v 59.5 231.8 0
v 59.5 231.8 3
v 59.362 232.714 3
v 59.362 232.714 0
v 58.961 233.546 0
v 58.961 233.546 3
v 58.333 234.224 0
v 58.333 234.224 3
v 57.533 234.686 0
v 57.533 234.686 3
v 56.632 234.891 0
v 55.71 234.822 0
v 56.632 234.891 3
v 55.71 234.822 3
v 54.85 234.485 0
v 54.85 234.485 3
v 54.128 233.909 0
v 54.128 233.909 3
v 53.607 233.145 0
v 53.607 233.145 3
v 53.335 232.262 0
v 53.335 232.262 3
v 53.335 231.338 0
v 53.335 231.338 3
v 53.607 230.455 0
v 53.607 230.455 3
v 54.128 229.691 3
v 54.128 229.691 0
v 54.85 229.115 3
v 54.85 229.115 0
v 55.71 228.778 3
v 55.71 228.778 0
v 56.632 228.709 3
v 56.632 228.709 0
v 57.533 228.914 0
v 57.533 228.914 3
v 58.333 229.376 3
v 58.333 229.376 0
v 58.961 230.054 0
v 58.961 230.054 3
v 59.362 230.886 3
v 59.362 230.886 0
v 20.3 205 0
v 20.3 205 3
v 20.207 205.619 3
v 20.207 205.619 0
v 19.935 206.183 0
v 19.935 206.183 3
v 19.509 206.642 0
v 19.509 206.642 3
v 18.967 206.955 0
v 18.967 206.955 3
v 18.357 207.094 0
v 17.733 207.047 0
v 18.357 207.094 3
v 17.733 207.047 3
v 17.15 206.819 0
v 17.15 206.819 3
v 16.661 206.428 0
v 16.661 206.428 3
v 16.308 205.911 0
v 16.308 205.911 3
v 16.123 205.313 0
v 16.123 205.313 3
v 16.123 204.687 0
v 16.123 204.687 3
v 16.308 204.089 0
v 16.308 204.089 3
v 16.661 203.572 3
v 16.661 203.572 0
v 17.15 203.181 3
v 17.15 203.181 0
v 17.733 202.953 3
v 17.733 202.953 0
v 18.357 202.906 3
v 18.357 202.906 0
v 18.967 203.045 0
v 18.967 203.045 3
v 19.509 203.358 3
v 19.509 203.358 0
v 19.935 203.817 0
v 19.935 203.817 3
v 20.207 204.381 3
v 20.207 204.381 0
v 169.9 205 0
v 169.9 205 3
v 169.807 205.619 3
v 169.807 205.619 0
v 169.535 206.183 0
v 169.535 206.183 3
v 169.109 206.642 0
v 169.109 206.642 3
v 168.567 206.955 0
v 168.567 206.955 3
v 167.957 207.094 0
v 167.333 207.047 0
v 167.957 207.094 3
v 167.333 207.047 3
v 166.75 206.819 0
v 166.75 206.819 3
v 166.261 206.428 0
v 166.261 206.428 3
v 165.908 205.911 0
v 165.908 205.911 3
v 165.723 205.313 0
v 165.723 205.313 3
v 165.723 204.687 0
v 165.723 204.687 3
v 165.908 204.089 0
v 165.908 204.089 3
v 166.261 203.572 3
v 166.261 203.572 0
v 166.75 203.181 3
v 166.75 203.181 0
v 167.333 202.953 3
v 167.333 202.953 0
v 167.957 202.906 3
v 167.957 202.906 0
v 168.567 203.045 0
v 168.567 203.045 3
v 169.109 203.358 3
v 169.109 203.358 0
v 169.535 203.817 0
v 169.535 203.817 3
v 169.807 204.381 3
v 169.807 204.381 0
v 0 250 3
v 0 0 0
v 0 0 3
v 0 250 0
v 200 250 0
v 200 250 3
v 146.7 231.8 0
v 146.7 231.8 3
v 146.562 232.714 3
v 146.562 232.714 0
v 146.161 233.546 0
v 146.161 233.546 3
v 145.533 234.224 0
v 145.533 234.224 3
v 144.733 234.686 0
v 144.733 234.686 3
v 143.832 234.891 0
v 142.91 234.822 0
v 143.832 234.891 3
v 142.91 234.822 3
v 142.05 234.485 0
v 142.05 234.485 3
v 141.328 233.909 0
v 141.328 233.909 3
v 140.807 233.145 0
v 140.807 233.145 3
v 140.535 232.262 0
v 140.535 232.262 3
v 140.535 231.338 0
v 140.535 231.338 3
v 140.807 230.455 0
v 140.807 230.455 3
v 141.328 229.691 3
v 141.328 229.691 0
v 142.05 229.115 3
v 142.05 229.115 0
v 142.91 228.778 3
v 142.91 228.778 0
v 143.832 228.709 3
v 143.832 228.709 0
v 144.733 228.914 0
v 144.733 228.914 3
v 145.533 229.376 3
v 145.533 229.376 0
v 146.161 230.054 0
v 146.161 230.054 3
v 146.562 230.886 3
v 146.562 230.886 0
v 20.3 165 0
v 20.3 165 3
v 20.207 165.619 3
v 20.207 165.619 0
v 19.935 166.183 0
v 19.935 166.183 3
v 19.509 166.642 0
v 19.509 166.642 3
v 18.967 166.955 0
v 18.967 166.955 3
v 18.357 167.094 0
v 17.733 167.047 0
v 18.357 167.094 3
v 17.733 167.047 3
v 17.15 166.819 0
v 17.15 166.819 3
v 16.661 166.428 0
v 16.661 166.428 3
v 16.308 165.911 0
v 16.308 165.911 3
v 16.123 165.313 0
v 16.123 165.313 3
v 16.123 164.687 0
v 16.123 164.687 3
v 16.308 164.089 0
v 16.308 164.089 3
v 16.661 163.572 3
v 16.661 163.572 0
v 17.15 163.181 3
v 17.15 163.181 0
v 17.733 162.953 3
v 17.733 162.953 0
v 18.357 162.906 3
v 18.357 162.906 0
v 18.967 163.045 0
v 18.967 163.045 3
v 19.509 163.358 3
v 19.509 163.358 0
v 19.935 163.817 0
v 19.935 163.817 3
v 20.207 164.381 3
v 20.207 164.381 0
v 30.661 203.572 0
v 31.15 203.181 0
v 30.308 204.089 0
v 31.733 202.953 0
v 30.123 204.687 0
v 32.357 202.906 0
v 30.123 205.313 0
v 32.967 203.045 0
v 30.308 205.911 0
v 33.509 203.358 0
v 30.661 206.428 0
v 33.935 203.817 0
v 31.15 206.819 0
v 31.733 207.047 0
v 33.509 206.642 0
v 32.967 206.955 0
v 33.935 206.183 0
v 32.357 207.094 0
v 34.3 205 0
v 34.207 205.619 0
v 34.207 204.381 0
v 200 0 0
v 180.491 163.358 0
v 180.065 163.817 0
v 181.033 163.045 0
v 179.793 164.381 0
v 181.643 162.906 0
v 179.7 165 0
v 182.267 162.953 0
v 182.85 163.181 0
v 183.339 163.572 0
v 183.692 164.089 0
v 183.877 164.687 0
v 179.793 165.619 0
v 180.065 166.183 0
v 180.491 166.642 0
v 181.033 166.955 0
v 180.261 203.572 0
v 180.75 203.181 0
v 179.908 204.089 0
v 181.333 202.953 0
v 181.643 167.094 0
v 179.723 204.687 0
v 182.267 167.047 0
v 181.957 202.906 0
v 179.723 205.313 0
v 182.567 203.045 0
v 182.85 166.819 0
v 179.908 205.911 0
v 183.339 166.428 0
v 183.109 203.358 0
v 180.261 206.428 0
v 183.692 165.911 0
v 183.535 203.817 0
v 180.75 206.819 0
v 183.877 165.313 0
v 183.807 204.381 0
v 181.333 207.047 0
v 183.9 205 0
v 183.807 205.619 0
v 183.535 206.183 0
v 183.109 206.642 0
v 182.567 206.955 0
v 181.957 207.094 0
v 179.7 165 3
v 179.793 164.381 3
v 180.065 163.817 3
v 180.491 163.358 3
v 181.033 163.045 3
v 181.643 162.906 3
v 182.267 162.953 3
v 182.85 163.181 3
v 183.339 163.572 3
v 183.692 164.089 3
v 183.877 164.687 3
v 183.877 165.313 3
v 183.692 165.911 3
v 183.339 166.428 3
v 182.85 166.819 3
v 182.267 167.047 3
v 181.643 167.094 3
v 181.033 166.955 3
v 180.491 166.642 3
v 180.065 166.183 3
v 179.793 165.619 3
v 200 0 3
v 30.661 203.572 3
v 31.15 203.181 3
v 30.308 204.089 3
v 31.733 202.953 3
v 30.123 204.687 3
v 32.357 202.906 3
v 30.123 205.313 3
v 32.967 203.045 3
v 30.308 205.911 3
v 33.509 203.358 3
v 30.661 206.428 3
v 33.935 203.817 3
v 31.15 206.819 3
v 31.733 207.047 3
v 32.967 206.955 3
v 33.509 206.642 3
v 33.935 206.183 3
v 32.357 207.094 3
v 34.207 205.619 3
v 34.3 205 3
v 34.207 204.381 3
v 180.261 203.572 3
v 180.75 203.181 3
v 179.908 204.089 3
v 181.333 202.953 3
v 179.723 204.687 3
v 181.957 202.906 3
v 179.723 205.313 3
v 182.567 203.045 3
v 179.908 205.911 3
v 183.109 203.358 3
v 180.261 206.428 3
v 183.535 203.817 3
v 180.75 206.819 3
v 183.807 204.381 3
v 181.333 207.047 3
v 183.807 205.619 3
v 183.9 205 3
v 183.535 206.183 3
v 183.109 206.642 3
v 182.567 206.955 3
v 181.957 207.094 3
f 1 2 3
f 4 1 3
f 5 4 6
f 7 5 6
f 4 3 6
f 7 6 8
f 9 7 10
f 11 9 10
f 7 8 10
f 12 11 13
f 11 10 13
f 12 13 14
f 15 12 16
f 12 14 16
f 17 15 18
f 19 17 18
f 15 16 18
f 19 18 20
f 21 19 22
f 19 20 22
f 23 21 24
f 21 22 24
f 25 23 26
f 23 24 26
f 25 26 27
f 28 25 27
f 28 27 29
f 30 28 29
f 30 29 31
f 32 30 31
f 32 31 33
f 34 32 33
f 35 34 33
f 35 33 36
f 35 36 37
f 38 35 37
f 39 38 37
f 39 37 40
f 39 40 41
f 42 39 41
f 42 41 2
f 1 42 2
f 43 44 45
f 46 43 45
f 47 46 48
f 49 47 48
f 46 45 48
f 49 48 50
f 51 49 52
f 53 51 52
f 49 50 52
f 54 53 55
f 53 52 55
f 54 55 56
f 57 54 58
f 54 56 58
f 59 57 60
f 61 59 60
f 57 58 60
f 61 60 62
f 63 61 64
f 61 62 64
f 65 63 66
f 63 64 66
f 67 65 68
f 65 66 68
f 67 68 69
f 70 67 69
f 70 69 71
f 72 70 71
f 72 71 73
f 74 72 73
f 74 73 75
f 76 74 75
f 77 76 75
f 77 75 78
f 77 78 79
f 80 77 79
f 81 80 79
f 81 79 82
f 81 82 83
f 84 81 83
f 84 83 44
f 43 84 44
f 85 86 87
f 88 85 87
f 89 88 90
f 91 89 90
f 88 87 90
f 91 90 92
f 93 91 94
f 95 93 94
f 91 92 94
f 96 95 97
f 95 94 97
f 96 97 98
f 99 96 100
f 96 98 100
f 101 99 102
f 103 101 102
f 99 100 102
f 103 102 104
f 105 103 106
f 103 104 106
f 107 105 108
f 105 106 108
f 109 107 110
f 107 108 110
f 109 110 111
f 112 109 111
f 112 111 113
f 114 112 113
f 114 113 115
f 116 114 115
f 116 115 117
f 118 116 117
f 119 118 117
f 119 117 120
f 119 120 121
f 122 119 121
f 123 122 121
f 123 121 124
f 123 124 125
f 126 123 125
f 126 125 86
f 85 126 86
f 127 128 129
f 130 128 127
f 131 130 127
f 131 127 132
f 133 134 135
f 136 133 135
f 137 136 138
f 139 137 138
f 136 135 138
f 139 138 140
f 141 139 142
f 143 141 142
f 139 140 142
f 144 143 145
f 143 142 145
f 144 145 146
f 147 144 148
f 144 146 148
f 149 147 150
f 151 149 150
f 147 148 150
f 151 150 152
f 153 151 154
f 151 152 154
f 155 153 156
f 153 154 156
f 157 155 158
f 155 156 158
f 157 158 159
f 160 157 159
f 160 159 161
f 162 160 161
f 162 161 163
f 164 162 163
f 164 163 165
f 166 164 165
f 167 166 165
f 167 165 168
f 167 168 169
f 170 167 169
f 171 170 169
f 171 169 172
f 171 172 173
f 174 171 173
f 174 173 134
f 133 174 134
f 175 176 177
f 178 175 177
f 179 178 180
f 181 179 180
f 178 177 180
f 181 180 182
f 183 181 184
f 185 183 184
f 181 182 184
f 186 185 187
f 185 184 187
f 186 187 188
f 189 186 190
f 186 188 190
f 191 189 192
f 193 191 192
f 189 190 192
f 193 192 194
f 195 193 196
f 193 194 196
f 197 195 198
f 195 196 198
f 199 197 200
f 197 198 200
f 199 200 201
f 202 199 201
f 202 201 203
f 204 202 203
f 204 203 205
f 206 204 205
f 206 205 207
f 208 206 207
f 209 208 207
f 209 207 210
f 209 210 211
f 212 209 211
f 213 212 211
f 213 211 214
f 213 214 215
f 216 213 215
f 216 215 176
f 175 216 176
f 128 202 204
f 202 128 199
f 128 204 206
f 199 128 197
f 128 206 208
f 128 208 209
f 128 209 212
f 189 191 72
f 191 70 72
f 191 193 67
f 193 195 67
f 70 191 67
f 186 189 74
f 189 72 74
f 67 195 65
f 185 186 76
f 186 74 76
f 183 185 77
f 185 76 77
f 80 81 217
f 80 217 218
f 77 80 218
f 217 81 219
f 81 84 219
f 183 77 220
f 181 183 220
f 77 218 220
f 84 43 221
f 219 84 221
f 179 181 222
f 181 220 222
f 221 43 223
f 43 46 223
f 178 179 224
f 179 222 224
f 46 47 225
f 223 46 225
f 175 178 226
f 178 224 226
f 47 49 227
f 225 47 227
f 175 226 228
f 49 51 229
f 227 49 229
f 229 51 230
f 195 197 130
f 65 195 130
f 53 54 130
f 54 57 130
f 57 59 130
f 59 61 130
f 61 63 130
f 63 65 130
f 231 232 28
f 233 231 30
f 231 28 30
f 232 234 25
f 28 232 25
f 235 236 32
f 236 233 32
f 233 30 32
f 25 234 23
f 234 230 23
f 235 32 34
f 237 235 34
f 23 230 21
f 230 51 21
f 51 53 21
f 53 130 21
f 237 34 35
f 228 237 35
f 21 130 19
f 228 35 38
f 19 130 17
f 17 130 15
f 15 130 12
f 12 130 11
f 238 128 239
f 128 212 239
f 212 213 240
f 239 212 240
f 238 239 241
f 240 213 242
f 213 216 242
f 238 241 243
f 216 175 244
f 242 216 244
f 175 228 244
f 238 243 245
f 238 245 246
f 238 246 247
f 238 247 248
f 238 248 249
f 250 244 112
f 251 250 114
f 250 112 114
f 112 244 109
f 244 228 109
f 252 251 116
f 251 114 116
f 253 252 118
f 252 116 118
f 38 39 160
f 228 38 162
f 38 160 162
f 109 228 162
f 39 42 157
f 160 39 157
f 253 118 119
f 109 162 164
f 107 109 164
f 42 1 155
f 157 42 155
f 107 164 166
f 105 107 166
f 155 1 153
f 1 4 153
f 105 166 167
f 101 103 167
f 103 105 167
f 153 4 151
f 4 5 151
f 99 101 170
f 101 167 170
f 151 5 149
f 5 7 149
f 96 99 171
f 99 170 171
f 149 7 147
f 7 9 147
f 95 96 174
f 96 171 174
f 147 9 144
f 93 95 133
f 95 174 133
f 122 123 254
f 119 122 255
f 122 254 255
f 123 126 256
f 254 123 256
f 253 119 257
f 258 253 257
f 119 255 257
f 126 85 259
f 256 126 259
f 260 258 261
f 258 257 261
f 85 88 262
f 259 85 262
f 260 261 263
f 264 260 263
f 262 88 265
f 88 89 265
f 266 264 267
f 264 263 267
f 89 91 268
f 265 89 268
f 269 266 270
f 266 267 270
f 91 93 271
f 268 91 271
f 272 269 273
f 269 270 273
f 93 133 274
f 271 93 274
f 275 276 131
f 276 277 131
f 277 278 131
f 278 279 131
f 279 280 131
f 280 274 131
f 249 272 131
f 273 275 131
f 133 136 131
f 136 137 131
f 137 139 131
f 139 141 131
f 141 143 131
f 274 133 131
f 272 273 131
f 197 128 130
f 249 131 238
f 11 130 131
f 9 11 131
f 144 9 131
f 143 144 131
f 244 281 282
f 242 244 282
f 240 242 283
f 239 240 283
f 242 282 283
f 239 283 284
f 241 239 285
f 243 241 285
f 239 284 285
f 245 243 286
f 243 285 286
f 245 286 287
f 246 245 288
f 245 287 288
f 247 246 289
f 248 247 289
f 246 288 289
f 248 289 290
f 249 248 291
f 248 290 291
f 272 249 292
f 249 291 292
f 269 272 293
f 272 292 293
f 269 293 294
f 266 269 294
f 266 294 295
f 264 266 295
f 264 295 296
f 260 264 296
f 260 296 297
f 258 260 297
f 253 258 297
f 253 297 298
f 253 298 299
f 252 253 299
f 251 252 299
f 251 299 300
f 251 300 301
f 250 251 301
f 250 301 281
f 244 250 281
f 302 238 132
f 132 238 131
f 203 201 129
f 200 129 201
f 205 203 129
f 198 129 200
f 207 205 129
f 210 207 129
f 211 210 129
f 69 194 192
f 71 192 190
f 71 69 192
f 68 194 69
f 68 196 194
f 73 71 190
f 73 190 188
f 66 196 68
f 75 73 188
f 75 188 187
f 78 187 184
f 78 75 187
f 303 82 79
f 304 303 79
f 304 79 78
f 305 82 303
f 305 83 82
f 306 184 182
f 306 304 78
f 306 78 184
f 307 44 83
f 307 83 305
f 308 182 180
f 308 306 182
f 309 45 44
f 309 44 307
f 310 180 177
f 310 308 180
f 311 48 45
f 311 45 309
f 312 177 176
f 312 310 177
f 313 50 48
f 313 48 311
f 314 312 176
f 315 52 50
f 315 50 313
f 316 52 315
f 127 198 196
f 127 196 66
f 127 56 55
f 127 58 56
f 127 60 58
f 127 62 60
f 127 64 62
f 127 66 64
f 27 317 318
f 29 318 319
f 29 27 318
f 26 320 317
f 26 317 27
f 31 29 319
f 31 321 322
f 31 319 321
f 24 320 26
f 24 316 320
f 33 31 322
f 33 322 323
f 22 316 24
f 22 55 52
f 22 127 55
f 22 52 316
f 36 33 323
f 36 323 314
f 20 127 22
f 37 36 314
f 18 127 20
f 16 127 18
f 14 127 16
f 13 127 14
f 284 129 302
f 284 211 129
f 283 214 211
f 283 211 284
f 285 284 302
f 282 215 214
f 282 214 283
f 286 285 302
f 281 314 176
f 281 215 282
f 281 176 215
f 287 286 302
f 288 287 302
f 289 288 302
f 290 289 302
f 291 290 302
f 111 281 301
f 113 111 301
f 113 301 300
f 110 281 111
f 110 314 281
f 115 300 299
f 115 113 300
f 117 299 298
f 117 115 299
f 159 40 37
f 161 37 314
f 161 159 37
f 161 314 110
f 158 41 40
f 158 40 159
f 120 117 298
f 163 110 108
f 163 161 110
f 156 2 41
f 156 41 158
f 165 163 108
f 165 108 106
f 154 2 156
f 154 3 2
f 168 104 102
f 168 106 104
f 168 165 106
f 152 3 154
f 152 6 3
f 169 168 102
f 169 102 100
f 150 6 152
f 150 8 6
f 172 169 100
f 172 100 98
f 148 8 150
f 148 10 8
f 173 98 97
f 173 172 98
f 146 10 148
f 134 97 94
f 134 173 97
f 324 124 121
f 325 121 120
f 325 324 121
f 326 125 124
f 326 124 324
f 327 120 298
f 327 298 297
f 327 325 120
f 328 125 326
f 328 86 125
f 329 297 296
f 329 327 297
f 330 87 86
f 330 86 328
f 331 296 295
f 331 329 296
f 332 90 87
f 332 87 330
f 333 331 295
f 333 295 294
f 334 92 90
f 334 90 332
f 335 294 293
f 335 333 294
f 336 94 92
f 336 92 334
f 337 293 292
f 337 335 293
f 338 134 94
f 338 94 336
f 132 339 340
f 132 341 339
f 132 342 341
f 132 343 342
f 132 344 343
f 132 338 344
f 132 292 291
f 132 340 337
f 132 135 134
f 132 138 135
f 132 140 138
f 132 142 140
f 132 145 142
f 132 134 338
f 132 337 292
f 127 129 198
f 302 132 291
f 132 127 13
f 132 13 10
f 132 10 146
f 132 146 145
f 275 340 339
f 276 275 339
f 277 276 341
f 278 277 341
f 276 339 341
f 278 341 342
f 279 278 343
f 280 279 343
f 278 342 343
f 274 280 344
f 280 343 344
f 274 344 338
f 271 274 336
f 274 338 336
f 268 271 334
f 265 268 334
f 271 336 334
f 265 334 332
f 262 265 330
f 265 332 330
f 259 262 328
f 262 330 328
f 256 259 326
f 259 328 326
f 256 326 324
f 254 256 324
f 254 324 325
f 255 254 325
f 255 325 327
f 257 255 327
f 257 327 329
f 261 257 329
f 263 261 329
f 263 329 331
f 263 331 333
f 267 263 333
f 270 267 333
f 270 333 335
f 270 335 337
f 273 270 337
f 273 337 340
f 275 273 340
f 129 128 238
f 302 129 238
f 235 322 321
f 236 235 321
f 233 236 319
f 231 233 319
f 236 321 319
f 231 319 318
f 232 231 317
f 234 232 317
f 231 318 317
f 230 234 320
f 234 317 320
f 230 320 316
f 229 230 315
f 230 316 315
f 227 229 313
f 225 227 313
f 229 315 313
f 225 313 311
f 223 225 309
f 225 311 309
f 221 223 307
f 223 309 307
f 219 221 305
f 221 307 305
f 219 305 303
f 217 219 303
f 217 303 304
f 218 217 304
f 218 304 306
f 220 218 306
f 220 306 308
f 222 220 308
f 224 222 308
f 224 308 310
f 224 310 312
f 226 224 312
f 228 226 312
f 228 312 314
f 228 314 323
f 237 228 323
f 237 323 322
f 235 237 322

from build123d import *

# Parameters (mm, degrees)
SZKIC1_W                    = 200
SZKIC1_H                    = 250
DODANIE_WYCI_GNI_CIE1_DEPTH = 3
SZKIC2_R                    = 2.1
SZKIC2_R_2                  = 3.1
WYTNIJ_WYCI_GNI_CIE1_DEPTH  = 321.170267202


with BuildPart() as part:
    # Szkic1 → Dodanie-wyciągnięcie1 (new body)
    with BuildSketch(Plane.XY):
        with Locations((100, 125)):
            Rectangle(SZKIC1_W, SZKIC1_H)
    extrude(amount=DODANIE_WYCI_GNI_CIE1_DEPTH)

    # Szkic2 → Wytnij-wyciągnięcie1 (cut, through all)
    with BuildSketch(Plane.XY.offset(3)):
        with Locations((18.2, 165)):
            Circle(SZKIC2_R)
        with Locations((56.4, 231.8)):
            Circle(SZKIC2_R_2)
        with Locations((143.6, 231.8)):
            Circle(SZKIC2_R_2)
        with Locations((167.8, 205)):
            Circle(SZKIC2_R)
        with Locations((181.8, 205)):
            Circle(SZKIC2_R)
        with Locations((18.2, 205)):
            Circle(SZKIC2_R)
        with Locations((32.2, 205)):
            Circle(SZKIC2_R)
        with Locations(Location((181.8, 165, 0), (0, 0, 180))):
            Circle(SZKIC2_R)
    extrude(amount=-WYTNIJ_WYCI_GNI_CIE1_DEPTH, mode=Mode.SUBTRACT)


solid = part.part
